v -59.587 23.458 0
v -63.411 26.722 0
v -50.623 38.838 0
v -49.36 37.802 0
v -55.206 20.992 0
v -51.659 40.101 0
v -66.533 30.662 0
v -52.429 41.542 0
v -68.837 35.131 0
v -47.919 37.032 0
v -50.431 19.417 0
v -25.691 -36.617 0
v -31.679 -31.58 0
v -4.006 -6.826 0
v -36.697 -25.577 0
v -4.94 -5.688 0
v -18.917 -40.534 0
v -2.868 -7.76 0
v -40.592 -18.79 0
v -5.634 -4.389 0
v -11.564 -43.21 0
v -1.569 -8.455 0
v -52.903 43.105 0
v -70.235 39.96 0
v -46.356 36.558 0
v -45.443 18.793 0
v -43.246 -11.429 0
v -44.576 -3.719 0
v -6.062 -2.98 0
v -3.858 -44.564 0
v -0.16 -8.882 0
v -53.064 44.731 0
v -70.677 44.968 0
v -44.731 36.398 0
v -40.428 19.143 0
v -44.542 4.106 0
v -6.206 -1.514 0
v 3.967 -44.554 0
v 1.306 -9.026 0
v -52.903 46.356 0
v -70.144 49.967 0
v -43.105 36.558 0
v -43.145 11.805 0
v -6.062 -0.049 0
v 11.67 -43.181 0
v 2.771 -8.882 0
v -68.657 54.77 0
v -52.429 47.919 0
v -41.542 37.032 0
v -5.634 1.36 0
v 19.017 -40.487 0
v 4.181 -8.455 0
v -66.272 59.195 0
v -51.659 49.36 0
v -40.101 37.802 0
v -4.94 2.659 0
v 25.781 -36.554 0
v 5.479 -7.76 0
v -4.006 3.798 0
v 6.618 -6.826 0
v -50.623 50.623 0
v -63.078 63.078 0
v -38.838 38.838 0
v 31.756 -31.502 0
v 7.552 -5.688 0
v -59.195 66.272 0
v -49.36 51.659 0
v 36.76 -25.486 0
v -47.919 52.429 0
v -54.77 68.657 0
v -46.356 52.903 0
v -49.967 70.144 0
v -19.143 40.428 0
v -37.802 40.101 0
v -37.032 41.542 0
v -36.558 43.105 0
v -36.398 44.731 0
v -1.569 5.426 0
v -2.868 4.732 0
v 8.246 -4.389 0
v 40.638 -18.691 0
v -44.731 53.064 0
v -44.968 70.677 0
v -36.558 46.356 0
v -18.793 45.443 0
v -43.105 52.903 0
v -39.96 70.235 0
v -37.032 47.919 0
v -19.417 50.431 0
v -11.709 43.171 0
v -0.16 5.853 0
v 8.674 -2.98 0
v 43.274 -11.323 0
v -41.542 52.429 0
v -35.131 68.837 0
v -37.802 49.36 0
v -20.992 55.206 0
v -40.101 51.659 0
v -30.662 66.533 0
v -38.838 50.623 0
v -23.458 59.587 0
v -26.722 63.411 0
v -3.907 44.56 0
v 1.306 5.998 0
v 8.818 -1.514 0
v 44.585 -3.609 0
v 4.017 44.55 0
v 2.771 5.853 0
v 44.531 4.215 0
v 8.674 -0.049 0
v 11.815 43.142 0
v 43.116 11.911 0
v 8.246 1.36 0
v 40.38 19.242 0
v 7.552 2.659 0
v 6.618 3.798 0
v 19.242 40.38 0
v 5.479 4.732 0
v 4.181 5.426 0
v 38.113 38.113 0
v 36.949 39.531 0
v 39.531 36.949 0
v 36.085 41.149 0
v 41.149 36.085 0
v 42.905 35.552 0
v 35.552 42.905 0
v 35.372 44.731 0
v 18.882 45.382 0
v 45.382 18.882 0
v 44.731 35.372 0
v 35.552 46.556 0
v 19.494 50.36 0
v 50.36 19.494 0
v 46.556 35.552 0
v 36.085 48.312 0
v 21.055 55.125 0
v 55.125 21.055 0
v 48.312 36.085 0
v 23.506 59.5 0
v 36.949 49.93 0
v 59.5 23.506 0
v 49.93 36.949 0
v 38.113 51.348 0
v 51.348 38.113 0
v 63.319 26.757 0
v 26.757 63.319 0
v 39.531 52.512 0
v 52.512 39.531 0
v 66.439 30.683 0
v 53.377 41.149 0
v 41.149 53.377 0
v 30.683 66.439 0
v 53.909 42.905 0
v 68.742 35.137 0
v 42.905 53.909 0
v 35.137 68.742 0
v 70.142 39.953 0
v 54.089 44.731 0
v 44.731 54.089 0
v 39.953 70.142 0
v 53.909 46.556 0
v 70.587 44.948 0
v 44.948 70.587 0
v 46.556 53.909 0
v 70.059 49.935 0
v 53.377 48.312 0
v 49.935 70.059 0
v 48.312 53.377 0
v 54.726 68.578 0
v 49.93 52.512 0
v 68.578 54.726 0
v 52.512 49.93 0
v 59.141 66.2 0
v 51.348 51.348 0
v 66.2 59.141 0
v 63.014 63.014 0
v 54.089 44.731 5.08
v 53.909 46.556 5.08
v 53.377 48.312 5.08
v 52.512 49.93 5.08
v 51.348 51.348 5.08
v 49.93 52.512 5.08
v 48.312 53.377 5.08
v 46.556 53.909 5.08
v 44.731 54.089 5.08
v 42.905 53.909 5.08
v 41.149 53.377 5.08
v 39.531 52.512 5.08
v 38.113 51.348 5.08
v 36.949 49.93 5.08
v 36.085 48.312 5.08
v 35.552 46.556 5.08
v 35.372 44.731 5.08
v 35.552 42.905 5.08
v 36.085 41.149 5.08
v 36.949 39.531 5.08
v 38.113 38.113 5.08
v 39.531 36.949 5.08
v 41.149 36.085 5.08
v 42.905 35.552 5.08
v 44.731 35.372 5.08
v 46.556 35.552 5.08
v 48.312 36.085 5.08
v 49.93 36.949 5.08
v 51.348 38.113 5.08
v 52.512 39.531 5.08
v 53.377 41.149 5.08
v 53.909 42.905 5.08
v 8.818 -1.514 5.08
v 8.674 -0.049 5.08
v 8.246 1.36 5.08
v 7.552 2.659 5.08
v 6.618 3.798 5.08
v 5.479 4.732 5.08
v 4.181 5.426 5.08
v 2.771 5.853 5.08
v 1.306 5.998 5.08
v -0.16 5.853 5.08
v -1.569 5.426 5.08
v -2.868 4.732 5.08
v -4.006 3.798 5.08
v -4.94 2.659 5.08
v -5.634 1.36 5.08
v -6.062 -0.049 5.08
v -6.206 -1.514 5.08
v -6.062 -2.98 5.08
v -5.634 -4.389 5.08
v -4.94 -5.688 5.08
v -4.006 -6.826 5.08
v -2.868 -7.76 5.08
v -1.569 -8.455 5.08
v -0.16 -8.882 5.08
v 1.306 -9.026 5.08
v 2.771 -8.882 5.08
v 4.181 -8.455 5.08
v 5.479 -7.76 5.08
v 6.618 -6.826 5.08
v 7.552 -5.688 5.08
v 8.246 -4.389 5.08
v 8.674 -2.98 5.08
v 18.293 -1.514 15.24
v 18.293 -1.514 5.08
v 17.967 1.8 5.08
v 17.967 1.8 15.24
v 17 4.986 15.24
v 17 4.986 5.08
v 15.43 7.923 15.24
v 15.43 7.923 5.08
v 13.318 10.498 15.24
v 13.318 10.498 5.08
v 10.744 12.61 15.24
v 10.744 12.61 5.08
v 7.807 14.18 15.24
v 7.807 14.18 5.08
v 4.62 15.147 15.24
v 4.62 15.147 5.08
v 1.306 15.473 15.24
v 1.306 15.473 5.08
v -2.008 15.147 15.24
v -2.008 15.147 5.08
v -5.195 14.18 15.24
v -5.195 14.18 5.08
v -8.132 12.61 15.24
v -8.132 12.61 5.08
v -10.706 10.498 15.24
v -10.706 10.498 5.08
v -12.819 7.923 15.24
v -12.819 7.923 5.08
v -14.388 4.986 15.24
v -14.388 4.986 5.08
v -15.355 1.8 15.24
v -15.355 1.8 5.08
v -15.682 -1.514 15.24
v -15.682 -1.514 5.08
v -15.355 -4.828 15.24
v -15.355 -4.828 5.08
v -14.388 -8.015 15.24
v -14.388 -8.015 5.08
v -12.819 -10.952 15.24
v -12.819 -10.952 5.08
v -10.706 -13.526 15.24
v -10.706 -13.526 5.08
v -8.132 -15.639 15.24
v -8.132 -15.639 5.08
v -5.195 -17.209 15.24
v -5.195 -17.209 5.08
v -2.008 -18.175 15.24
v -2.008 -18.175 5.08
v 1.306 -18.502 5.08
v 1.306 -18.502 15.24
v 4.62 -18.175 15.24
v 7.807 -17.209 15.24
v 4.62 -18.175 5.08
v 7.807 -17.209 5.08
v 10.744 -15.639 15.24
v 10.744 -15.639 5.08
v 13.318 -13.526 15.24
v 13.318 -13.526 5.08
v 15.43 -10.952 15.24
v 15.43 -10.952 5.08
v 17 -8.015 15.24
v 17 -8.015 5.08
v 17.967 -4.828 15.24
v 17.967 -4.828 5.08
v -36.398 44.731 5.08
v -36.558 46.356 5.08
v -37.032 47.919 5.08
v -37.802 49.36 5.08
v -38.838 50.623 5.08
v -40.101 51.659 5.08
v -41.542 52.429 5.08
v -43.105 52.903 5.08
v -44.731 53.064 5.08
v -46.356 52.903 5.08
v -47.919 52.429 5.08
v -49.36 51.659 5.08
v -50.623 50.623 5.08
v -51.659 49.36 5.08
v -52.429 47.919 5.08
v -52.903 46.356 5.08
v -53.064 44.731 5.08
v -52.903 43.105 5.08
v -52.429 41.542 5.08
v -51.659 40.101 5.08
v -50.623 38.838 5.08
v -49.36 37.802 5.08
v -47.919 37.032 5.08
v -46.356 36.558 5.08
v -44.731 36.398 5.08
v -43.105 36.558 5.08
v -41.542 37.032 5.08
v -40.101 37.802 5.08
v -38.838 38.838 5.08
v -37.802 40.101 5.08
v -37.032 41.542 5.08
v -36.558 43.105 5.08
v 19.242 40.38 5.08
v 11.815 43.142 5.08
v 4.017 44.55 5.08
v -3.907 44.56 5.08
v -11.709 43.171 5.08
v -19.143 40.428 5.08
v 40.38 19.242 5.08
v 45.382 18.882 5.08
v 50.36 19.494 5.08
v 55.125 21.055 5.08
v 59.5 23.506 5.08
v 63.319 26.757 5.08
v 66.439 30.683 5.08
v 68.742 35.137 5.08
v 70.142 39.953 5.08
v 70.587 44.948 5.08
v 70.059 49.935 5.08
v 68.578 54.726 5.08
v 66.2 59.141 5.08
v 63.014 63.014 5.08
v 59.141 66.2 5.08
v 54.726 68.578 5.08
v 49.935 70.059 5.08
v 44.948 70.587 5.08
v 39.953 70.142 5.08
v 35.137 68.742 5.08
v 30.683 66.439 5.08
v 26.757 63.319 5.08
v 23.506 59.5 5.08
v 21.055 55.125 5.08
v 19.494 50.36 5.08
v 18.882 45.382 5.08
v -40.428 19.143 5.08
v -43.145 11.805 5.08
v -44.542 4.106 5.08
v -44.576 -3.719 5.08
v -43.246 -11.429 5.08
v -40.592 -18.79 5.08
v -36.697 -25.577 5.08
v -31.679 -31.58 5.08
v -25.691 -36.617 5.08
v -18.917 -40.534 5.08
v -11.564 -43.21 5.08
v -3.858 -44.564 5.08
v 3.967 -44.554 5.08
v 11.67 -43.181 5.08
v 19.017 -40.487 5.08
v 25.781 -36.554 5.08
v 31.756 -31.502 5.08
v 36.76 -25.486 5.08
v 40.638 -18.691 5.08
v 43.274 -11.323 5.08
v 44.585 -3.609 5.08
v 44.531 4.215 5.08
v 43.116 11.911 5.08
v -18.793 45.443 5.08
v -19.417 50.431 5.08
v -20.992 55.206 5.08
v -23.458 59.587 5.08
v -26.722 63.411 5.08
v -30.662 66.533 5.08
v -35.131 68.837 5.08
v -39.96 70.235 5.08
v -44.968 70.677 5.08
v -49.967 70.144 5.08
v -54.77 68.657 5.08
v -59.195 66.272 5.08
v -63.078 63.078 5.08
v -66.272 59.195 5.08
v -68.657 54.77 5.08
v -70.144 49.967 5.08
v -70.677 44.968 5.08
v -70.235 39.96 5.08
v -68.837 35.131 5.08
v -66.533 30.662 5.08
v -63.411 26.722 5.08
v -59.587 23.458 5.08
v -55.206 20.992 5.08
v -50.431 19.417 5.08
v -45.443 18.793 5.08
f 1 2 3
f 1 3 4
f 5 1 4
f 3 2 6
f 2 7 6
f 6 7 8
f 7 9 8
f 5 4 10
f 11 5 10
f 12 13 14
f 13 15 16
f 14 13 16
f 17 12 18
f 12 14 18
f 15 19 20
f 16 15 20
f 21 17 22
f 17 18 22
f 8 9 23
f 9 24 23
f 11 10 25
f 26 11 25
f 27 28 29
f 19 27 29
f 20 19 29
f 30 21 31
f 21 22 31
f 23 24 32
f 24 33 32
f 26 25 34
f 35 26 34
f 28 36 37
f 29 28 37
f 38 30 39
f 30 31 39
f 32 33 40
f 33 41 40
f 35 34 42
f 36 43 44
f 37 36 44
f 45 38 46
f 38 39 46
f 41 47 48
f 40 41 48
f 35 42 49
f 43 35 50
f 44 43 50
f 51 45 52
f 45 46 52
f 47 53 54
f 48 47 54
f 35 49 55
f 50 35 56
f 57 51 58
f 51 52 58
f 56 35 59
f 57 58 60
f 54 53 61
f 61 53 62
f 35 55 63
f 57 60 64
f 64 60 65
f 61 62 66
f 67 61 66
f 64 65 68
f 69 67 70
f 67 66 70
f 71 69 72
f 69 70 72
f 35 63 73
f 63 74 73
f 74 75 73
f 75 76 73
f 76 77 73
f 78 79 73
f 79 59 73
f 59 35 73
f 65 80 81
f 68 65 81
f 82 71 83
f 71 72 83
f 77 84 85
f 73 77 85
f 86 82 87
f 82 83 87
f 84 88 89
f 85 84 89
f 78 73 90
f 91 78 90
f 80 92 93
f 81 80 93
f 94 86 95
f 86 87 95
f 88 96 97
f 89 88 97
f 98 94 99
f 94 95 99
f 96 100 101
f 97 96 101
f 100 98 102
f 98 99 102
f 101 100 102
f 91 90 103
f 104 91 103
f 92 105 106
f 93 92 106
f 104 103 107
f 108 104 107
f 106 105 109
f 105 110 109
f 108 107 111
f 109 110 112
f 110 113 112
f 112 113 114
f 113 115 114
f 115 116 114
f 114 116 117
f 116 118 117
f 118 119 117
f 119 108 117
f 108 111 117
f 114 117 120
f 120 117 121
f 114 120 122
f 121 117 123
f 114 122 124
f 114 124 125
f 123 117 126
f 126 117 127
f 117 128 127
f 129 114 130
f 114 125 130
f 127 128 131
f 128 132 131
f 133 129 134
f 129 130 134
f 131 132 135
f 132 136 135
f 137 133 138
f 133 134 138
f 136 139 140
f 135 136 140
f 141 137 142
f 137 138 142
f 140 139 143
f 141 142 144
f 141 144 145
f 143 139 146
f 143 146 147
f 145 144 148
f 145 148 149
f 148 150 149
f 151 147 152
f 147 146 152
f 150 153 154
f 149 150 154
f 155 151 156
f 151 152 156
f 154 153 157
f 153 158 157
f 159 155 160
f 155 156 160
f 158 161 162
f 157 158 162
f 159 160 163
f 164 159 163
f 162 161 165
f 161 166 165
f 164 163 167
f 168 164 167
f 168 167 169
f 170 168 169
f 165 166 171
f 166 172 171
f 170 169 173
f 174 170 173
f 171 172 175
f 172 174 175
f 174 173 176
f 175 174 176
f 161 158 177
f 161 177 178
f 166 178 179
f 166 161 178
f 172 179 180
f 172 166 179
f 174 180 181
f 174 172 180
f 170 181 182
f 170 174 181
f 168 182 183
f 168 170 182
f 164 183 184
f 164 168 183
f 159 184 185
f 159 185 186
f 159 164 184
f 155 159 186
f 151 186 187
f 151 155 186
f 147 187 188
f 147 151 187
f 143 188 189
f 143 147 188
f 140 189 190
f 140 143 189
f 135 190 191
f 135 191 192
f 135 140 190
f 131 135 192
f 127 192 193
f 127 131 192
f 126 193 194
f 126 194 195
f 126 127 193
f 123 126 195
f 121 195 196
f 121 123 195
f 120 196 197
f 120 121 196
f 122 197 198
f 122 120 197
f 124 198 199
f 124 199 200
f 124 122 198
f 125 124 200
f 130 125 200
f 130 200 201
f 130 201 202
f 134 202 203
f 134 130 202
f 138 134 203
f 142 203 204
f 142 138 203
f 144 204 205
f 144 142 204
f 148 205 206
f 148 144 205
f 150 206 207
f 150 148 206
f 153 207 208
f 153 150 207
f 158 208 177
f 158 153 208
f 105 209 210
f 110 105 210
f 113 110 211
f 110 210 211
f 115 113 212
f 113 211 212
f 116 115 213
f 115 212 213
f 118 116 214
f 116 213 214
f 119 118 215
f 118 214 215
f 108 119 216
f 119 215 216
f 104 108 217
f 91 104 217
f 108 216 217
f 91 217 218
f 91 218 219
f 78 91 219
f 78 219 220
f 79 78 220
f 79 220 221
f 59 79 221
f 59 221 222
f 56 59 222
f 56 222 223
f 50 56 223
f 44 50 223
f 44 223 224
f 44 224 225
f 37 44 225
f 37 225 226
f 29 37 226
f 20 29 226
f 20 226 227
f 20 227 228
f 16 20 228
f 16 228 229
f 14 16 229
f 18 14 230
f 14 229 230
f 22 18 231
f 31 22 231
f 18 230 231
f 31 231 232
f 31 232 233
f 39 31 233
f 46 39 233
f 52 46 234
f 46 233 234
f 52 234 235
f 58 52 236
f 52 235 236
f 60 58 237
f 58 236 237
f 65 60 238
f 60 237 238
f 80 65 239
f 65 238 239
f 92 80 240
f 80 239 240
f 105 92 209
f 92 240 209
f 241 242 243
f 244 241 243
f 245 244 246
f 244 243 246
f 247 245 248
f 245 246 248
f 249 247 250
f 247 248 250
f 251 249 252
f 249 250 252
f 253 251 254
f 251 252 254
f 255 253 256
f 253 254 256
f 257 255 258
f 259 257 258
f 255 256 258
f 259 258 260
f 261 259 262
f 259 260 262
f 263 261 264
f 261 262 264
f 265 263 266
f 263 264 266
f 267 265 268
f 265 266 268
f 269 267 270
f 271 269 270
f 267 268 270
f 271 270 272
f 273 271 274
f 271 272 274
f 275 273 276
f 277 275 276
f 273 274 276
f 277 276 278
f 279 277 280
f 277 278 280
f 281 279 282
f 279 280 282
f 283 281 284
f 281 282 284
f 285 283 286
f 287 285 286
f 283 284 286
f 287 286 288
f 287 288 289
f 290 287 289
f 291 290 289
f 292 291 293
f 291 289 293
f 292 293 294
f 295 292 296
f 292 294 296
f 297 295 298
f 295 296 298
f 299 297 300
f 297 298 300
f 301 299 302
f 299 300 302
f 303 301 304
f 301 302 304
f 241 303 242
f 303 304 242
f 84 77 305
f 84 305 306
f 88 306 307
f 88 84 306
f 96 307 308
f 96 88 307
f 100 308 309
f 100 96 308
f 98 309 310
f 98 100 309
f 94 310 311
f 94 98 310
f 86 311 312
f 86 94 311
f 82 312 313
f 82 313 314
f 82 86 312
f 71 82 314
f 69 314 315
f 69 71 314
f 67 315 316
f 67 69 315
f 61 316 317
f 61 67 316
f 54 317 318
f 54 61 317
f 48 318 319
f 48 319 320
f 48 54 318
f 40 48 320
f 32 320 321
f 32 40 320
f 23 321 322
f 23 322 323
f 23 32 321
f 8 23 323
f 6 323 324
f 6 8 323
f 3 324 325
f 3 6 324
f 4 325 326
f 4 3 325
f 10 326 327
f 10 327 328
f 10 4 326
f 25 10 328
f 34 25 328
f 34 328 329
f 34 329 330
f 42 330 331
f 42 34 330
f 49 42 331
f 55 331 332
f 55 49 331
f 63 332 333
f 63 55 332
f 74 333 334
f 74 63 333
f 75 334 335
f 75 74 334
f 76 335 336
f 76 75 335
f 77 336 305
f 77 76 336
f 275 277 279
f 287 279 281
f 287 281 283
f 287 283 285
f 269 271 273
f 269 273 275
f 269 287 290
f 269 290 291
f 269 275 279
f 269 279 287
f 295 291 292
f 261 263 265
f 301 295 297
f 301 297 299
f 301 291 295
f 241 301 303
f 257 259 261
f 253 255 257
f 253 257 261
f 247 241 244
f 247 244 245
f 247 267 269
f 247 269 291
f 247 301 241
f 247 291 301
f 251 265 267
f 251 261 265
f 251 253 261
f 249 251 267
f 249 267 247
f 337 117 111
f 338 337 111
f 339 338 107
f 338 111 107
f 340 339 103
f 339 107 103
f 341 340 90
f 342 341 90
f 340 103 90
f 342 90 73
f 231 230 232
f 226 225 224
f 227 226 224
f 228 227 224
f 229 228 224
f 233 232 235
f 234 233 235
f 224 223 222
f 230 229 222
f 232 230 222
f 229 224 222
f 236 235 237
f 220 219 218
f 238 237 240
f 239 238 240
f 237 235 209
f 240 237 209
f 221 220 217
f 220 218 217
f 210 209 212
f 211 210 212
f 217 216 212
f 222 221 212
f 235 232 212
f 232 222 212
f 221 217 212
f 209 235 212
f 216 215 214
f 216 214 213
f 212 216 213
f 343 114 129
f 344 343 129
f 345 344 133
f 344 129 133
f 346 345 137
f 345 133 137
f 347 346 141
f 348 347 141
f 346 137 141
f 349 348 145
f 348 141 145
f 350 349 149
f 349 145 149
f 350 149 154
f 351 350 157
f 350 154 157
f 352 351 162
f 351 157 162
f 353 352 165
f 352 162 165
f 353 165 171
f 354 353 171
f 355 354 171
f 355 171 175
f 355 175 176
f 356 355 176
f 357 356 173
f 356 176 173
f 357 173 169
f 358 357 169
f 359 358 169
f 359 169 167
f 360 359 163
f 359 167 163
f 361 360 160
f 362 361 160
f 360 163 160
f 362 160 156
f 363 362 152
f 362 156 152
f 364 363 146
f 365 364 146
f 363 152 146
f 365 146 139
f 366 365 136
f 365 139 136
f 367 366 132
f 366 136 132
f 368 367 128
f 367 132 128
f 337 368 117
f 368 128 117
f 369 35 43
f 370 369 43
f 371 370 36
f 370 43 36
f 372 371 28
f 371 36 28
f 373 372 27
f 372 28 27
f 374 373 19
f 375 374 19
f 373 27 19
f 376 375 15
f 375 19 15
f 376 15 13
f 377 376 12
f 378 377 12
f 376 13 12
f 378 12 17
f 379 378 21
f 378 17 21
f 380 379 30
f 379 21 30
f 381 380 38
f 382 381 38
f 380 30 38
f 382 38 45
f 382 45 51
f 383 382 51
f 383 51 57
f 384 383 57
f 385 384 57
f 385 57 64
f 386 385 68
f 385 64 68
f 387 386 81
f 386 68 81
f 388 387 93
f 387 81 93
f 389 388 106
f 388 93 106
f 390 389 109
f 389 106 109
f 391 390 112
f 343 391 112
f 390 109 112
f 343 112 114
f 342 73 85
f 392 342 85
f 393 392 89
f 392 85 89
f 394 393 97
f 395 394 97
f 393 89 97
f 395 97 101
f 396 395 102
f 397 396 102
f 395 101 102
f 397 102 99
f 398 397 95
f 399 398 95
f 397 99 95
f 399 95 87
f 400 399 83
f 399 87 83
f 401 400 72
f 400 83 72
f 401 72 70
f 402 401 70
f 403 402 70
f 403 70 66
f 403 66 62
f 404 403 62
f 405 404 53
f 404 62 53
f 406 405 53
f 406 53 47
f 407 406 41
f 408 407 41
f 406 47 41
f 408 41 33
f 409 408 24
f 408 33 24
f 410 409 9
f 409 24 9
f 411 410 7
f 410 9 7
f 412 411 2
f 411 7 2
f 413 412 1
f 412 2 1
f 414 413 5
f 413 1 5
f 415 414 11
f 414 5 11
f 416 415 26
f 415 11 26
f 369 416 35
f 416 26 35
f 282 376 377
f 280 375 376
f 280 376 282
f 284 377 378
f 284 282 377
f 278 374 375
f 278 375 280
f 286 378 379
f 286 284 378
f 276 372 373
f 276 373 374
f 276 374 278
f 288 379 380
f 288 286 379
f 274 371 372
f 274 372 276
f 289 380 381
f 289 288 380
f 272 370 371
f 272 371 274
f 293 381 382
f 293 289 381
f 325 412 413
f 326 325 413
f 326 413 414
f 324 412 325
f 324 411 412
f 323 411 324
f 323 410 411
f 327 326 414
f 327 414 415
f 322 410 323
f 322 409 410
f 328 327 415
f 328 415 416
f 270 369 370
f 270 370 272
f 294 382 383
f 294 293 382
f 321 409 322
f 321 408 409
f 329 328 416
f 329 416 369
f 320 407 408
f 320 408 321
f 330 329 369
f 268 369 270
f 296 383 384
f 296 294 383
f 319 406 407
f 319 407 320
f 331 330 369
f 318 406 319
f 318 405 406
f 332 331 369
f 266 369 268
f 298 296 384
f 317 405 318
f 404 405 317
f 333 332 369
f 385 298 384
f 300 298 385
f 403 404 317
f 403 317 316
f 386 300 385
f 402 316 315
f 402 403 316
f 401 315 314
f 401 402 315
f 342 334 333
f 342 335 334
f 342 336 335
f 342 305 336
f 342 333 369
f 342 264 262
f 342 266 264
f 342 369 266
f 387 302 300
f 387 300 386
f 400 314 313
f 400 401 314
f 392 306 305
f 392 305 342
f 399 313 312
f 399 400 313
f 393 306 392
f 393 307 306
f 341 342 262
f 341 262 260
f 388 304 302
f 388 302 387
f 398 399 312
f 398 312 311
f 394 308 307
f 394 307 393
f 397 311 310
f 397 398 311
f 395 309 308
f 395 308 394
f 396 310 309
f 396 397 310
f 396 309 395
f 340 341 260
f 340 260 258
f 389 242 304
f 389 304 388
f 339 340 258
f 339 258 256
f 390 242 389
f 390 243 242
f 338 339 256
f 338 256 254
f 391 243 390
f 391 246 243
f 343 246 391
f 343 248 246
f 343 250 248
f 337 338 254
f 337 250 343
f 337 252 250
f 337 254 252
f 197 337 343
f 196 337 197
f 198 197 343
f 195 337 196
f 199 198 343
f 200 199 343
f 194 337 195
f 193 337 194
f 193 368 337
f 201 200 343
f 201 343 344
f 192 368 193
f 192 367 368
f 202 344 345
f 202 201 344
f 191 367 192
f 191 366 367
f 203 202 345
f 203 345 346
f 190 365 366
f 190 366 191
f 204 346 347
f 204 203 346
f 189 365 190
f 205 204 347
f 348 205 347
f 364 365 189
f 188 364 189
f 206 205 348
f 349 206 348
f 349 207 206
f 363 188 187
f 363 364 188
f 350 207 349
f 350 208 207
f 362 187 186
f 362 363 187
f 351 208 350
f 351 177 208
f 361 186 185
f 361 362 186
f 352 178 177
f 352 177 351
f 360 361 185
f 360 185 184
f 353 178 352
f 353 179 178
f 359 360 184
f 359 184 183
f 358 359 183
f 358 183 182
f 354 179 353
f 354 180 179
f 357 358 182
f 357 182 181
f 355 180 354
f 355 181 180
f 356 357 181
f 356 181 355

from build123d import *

# Parameters (mm, degrees)
SKETCH1_R           = 8.332963545
SKETCH1_R_2         = 9.35840883
BOSS_EXTRUDE2_DEPTH = 5.08
SKETCH2_R           = 16.987426911
BOSS_EXTRUDE3_DEPTH = 10.16
SKETCH2_3_R         = 7.512157001
CUT_EXTRUDE1_DEPTH  = 10.16
SKETCH2_4_R         = 16.987426911
SKETCH2_4_R_2       = 7.512157001
BOSS_EXTRUDE4_DEPTH = 10.16


with BuildPart() as part:
    # Sketch1 → Boss-Extrude2 (new body)
    with BuildSketch(Plane.XY):
        with BuildLine():
            ThreePointArc((-40.42750083, 19.142632152), (0.054998173, -44.730528326), (40.380305232, 19.241988943))
            ThreePointArc((40.380305232, 19.241988943), (63.014326775, 63.014326775), (19.241988943, 40.380305232))
            ThreePointArc((19.241988943, 40.380305232), (0.054998173, 44.730528326), (-19.142632152, 40.42750083))
            ThreePointArc((-19.142632152, 40.42750083), (-63.078021056, 63.078021056), (-40.42750083, 19.142632152))
        make_face()
        with Locations((-44.730562137, 44.730562137)):
            Circle(SKETCH1_R, mode=Mode.SUBTRACT)
        with Locations((44.730562137, 44.730562137)):
            Circle(SKETCH1_R_2, mode=Mode.SUBTRACT)
    extrude(amount=BOSS_EXTRUDE2_DEPTH)

    # Sketch2 → Boss-Extrude3 (add)
    with BuildSketch(Plane.XY.offset(5.08)):
        with Locations((1.305897397, -1.51434167)):
            Circle(SKETCH2_R)
    extrude(amount=BOSS_EXTRUDE3_DEPTH)

    # Sketch2<3> → Cut-Extrude1 (cut)
    with BuildSketch(Plane.XY.offset(5.08)):
        with Locations((1.305897397, -1.51434167)):
            Circle(SKETCH2_3_R)
    extrude(amount=-CUT_EXTRUDE1_DEPTH, mode=Mode.SUBTRACT)

    # Sketch2<4> → Boss-Extrude4 (add, through all)
    with BuildSketch(Plane.XY.offset(5.08)):
        with Locations((1.305897397, -1.51434167)):
            Circle(SKETCH2_4_R)
        with Locations((1.305897397, -1.51434167)):
            Circle(SKETCH2_4_R_2, mode=Mode.SUBTRACT)
    extrude(amount=BOSS_EXTRUDE4_DEPTH)


solid = part.part
